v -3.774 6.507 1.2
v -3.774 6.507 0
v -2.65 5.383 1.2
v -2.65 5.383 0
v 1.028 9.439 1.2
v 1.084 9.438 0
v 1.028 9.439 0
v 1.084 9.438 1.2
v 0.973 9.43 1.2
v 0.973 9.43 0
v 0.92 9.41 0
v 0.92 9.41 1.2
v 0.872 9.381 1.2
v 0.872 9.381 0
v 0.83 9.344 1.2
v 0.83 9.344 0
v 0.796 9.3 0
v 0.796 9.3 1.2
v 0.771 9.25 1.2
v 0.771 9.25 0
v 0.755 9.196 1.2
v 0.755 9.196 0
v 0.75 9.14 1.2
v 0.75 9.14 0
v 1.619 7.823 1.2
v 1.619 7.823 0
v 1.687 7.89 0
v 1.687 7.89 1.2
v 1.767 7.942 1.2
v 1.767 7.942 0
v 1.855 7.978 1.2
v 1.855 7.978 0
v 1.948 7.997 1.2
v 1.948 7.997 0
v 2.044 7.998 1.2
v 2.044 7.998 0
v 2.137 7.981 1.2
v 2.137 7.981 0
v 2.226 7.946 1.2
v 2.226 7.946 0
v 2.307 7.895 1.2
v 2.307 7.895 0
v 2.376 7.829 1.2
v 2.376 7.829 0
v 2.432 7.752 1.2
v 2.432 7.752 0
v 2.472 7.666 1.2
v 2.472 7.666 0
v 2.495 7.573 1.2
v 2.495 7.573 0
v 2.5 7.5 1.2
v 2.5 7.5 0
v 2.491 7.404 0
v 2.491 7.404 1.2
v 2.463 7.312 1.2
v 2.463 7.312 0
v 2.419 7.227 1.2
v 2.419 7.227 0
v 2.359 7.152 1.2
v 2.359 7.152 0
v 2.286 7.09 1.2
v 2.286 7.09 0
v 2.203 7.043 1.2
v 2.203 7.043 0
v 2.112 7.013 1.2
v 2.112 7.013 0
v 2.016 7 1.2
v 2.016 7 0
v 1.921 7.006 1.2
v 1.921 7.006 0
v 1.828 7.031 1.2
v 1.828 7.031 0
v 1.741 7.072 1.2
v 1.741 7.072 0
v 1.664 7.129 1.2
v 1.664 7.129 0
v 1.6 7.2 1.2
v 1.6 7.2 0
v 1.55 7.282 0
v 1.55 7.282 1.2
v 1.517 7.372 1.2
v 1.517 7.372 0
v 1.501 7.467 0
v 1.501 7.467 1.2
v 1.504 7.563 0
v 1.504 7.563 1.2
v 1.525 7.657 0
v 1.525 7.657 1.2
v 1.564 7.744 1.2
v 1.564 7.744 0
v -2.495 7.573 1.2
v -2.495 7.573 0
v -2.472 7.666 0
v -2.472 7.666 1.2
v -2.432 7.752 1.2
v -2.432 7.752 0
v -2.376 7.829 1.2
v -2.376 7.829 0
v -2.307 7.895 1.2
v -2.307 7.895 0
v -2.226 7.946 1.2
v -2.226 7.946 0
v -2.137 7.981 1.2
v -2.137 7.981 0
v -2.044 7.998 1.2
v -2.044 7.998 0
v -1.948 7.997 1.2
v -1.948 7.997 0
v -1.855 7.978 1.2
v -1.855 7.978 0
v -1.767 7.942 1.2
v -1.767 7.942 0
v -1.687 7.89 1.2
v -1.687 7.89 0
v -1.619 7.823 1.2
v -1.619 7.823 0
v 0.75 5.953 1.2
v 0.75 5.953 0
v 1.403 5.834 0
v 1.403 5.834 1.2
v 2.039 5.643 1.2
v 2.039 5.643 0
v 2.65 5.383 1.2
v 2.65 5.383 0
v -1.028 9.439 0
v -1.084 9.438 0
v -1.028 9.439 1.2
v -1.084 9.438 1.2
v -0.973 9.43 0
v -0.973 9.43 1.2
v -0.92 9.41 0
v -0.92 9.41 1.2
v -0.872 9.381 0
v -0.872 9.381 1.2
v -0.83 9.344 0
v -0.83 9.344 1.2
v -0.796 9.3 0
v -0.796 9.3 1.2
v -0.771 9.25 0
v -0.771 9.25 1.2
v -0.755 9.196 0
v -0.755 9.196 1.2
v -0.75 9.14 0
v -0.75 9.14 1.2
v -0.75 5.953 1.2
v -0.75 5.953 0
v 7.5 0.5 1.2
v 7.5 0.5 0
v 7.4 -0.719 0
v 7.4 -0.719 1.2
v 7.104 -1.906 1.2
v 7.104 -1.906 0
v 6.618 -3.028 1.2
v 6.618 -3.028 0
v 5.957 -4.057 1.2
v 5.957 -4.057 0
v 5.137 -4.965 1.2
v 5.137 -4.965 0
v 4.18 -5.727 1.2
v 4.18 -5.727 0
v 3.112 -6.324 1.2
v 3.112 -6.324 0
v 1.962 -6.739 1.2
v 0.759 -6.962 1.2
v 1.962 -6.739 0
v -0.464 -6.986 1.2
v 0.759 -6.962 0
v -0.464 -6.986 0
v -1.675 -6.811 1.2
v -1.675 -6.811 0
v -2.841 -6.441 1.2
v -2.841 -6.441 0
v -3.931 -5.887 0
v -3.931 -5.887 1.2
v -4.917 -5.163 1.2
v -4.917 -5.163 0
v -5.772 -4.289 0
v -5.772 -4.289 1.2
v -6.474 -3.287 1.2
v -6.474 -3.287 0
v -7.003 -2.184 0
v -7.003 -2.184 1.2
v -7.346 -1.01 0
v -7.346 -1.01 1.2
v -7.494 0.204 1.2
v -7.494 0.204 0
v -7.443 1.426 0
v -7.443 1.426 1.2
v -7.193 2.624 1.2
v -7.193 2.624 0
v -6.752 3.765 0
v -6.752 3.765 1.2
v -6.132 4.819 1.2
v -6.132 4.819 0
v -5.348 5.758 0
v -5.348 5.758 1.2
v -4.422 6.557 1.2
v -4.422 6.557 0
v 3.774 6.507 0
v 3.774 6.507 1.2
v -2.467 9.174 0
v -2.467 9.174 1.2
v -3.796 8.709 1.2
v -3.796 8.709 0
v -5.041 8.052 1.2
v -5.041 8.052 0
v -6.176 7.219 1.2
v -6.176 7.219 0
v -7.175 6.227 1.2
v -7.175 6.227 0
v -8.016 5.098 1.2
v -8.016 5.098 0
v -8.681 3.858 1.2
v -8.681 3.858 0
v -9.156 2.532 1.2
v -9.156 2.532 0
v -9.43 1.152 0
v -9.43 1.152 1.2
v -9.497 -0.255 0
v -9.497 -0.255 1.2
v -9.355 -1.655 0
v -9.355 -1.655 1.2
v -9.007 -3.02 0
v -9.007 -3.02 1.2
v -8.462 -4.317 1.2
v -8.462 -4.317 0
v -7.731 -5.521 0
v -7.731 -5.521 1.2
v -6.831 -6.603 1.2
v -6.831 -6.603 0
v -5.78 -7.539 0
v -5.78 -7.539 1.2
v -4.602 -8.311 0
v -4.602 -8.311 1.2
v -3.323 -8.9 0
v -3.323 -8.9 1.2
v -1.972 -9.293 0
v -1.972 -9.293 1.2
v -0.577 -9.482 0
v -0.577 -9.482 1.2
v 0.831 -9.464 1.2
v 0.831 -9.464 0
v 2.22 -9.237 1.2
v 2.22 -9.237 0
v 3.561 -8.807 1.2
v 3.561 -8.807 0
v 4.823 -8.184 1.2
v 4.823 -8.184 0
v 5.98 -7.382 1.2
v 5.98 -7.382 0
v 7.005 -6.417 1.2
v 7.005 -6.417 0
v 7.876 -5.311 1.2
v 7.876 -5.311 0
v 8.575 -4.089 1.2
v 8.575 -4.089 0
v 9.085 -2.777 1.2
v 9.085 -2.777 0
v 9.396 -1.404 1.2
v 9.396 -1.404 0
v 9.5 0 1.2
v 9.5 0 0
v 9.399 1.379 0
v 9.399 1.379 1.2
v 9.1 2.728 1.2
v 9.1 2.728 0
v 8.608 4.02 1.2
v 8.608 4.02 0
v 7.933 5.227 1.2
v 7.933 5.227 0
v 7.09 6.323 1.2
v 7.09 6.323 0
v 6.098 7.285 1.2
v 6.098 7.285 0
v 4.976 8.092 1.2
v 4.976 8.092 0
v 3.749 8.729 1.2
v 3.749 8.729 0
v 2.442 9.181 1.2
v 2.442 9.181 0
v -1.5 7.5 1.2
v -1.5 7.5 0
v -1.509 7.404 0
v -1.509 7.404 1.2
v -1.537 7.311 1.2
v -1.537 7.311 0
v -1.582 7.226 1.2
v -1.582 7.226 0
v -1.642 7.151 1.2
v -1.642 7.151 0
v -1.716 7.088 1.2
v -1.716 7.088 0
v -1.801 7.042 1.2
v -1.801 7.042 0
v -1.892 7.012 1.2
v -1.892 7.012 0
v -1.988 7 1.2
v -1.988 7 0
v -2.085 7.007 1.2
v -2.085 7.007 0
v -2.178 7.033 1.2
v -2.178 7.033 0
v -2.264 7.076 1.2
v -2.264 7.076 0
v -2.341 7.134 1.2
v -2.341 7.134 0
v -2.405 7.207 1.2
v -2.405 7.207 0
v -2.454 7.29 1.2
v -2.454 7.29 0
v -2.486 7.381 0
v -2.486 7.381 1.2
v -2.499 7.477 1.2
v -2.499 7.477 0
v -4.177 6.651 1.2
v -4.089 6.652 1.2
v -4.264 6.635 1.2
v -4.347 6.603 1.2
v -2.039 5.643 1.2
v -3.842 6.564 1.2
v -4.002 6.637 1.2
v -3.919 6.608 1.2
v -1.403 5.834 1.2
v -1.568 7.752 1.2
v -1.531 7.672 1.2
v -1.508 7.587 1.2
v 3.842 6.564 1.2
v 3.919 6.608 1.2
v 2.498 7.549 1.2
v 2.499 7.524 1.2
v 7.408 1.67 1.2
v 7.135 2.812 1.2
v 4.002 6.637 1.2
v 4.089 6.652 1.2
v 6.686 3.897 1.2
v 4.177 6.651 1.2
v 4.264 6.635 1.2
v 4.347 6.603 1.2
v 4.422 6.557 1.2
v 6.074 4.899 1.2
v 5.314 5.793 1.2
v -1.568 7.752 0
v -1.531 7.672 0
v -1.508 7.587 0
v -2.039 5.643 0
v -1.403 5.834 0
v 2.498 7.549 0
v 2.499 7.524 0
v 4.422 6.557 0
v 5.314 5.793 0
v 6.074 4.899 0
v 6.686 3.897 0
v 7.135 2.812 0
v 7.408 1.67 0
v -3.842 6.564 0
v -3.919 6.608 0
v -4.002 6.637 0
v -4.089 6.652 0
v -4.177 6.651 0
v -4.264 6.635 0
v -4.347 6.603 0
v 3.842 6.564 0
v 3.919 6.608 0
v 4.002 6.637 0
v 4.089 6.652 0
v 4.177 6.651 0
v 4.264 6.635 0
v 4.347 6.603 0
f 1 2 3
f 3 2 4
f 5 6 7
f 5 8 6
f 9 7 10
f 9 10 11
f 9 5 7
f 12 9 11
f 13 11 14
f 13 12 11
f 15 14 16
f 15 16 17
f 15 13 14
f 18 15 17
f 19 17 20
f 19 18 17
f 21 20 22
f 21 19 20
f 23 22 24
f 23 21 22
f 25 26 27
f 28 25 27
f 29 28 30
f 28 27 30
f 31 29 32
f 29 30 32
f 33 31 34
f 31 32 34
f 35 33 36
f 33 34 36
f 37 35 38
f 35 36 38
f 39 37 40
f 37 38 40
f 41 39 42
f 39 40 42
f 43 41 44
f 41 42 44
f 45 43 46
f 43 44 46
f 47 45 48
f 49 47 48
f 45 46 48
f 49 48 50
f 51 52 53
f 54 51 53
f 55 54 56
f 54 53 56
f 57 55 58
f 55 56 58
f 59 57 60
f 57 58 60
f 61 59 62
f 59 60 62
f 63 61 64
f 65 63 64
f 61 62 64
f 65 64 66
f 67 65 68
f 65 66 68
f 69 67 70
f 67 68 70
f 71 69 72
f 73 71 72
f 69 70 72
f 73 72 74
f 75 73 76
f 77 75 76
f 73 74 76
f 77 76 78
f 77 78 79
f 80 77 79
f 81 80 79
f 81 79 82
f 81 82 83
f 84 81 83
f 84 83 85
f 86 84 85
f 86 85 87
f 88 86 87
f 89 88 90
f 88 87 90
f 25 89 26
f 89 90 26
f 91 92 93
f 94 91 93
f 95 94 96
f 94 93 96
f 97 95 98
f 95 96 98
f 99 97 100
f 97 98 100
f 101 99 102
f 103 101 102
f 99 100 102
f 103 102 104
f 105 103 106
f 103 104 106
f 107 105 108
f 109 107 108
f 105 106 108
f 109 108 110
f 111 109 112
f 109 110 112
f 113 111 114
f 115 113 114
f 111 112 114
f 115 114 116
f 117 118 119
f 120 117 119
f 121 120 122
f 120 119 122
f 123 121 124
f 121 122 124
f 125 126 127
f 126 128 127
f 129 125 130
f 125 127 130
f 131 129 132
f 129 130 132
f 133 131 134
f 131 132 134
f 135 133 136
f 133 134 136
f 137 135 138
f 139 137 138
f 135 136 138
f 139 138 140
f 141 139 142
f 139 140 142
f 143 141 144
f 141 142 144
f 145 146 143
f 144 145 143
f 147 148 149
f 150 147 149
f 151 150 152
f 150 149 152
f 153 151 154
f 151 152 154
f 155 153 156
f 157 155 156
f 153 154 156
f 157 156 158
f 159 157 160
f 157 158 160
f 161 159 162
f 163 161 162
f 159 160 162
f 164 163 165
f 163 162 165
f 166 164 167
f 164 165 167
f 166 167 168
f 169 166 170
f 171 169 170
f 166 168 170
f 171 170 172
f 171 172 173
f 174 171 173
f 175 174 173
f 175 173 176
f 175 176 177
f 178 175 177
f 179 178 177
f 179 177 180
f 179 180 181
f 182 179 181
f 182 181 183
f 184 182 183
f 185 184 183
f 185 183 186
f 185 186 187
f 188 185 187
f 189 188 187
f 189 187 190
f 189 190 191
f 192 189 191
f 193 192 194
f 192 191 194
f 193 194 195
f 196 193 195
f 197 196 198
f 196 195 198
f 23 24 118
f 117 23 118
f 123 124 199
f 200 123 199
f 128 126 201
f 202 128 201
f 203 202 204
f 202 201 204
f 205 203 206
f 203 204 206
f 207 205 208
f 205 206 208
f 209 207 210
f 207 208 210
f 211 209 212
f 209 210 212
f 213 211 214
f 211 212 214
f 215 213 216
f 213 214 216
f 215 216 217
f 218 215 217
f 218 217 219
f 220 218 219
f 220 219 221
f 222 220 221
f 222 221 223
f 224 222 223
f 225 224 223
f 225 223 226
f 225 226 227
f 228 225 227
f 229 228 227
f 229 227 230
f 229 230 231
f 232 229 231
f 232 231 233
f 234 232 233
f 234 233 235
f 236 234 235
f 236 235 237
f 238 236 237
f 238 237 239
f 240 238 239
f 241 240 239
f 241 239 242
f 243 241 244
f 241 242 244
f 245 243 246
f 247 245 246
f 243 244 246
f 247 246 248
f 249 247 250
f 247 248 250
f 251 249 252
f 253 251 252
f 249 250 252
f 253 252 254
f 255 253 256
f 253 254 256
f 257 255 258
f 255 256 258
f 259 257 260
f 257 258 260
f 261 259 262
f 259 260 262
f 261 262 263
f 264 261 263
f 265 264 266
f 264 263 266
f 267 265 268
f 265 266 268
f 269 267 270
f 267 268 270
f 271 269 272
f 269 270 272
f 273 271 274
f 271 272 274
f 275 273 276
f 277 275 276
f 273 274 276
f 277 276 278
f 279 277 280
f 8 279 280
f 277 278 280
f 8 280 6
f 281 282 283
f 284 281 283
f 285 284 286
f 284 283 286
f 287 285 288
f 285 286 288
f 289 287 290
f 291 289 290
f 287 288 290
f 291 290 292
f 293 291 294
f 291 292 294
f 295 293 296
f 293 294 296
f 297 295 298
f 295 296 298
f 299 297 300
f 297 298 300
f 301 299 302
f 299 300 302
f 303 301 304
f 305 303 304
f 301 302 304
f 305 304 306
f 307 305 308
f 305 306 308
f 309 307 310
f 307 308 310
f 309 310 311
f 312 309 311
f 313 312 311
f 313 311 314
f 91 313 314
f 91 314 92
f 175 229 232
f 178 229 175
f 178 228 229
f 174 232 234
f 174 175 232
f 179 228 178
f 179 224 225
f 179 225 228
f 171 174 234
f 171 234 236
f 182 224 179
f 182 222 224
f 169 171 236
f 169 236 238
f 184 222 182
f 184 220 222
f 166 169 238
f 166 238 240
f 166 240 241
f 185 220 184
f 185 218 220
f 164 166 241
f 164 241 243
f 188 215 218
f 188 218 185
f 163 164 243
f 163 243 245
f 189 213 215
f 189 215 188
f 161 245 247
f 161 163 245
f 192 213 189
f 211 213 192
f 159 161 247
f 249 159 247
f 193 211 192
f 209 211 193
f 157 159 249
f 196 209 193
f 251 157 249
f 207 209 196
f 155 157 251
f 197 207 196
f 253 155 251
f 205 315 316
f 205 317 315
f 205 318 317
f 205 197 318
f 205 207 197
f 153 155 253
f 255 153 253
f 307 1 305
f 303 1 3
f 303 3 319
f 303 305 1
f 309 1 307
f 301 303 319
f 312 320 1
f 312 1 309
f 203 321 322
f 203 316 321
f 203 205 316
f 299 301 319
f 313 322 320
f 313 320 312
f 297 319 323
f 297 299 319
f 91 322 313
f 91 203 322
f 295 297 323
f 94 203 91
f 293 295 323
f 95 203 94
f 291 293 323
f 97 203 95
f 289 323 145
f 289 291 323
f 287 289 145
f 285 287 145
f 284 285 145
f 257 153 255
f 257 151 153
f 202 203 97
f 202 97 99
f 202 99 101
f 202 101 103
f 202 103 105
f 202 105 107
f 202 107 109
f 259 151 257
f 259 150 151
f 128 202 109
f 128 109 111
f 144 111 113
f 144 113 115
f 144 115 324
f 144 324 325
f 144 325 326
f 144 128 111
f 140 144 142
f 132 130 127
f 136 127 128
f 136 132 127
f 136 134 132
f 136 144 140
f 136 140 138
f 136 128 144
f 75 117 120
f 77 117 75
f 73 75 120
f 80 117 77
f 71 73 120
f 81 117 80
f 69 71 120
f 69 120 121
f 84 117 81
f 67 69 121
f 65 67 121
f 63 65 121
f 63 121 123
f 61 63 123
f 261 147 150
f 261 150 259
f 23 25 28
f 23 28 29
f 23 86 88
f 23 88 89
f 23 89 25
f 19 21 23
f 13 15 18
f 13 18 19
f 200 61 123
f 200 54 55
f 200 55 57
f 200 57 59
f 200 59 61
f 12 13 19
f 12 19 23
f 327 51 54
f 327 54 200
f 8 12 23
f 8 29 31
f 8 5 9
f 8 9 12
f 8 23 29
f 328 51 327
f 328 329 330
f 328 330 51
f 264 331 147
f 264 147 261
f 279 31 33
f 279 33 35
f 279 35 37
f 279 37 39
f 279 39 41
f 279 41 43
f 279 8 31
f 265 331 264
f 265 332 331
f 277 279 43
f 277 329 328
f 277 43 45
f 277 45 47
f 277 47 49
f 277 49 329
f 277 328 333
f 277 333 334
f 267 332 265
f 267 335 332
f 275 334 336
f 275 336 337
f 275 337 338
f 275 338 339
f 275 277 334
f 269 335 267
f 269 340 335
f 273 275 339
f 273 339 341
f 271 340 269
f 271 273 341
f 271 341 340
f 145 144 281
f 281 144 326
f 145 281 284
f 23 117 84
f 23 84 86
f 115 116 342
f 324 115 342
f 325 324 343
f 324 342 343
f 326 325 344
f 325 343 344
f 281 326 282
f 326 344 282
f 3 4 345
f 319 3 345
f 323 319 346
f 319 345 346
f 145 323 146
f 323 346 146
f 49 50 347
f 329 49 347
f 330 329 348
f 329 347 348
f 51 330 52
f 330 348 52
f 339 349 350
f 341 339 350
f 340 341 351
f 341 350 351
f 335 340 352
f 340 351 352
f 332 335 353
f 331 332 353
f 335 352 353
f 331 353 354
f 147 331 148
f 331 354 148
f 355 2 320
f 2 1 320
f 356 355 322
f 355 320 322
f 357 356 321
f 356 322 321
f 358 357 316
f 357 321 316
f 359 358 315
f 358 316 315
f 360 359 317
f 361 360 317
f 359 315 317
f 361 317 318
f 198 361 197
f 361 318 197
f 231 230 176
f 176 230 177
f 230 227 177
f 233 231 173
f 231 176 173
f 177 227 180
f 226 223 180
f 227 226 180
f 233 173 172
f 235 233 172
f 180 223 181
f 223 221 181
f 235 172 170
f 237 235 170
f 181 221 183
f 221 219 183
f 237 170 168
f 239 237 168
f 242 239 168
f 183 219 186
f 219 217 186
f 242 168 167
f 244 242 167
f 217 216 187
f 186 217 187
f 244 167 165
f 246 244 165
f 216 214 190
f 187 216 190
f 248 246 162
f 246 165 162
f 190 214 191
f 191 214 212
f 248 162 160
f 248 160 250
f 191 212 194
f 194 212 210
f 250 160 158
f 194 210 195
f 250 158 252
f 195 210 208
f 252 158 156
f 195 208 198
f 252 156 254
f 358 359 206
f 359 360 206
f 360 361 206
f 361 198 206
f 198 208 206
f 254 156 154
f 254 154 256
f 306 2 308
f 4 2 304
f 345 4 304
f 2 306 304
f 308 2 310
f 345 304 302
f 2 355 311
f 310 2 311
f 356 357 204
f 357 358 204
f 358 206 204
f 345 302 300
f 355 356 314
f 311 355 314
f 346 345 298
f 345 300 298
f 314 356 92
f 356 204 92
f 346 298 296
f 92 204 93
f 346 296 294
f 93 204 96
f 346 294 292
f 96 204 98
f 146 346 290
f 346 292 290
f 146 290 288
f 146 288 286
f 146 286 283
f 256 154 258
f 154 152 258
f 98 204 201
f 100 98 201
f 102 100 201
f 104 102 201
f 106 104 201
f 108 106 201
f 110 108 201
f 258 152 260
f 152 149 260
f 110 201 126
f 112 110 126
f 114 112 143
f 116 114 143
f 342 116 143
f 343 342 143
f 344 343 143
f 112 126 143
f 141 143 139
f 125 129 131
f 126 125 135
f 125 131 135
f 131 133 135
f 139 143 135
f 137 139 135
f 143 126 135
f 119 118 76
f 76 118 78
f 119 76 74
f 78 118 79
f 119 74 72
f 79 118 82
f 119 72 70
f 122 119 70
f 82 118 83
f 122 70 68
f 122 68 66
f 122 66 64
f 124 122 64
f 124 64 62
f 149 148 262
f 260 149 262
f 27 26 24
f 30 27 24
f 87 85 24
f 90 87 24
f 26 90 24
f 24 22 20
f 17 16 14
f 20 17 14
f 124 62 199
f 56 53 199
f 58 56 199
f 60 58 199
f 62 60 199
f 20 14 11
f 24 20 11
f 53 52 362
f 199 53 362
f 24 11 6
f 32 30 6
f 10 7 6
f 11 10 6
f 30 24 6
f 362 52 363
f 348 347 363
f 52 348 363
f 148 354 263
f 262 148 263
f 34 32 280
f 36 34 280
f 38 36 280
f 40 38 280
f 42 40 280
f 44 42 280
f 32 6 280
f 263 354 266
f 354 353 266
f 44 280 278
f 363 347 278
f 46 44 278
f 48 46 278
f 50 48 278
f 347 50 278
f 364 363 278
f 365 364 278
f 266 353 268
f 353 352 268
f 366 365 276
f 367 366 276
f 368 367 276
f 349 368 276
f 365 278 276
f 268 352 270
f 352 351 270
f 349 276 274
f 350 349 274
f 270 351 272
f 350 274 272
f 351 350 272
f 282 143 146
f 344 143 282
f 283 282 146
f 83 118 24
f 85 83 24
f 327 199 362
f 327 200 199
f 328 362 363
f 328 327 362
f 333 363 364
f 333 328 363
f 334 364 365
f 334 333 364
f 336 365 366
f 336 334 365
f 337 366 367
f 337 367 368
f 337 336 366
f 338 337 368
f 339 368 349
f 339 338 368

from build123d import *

# Parameters (mm, degrees)
F1_DEPTH = 1.2
F2_R     = 0.3
F3_R     = 0.5


with BuildPart() as f1:
    # F0 (on Top) → F1 (new body)
    with BuildSketch(Plane.XY):
        with BuildLine():
            ThreePointArc((-0.75, 9.4703484624), (-6.4468984791, -6.9776428685), (9.5, 0))
            ThreePointArc((9.5, 0), (6.9776428685, 6.4468984791), (0.75, 9.4703484624))
            Line((0.75, 9.4703484624), (0.75, 7.9624057783))
            ThreePointArc((0.75, 7.9624057783), (1.1863210749, 7.9055818345), (1.61855899, 7.82326886))
            ThreePointArc((1.61855899, 7.82326886), (2.1373605639, 7.9807619738), (2.4946485572, 7.5729575551))
            ThreePointArc((2.4946485572, 7.5729575551), (3.3038970926, 7.2330724043), (4.0678951533, 6.8009704825))
            ThreePointArc((4.0678951533, 6.8009704825), (6.5863196722, 4.0875330208), (7.5, 0.5))
            ThreePointArc((7.5, 0.5), (-3.5875330208, -6.0863196722), (-4.0678951533, 6.8009704825))
            ThreePointArc((-4.0678951533, 6.8009704825), (-3.3038970926, 7.2330724043), (-2.4946485572, 7.5729575551))
            ThreePointArc((-2.4946485572, 7.5729575551), (-2.1373605639, 7.9807619738), (-1.61855899, 7.82326886))
            ThreePointArc((-1.61855899, 7.82326886), (-1.1863210749, 7.9055818345), (-0.75, 7.9624057783))
            Line((-0.75, 7.9624057783), (-0.75, 9.4703484624))
        make_face()
        with BuildLine():
            Line((-0.75, 5.9529404499), (-0.75, 7.9624057783))
            ThreePointArc((-0.75, 7.9624057783), (-1.1863210749, 7.9055818345), (-1.61855899, 7.82326886))
            ThreePointArc((-1.61855899, 7.82326886), (-1.5305745506, 7.6721619804), (-1.5, 7.5))
            ThreePointArc((-1.5, 7.5), (-2.0365767781, 7.0013396554), (-2.4946485572, 7.5729575551))
            ThreePointArc((-2.4946485572, 7.5729575551), (-3.3038970926, 7.2330724043), (-4.0678951533, 6.8009704825))
            Line((-4.0678951533, 6.8009704825), (-2.65, 5.3830753292))
            ThreePointArc((-2.65, 5.3830753292), (-1.7237130167, 5.7470699871), (-0.75, 5.9529404499))
        make_face()
        with BuildLine():
            ThreePointArc((1.61855899, 7.82326886), (1.1863210749, 7.9055818345), (0.75, 7.9624057783))
            Line((0.75, 7.9624057783), (0.75, 5.9529404499))
            ThreePointArc((0.75, 5.9529404499), (1.7237130167, 5.7470699871), (2.65, 5.3830753292))
            Line((2.65, 5.3830753292), (4.0678951533, 6.8009704825))
            ThreePointArc((4.0678951533, 6.8009704825), (3.3038970926, 7.2330724043), (2.4946485572, 7.5729575551))
            ThreePointArc((2.4946485572, 7.5729575551), (2.4986603446, 7.5365767781), (2.5, 7.5))
            ThreePointArc((2.5, 7.5), (1.8278380196, 7.0305745506), (1.61855899, 7.82326886))
        make_face()
    extrude(amount=F1_DEPTH)

    # F2
    f2_edges = [f1.edges().sort_by_distance(p)[0] for p in [
        (-0.75, 9.470348, 0.6),
        (0.75, 9.470348, 0.6),
    ]]
    fillet(f2_edges, radius=F2_R)

    # F3
    f3_edges = [f1.edges().sort_by_distance(p)[0] for p in [
        (-4.067895, 6.80097, 0.6),
        (4.067895, 6.80097, 0.6),
    ]]
    fillet(f3_edges, radius=F3_R)


solid = f1.part
